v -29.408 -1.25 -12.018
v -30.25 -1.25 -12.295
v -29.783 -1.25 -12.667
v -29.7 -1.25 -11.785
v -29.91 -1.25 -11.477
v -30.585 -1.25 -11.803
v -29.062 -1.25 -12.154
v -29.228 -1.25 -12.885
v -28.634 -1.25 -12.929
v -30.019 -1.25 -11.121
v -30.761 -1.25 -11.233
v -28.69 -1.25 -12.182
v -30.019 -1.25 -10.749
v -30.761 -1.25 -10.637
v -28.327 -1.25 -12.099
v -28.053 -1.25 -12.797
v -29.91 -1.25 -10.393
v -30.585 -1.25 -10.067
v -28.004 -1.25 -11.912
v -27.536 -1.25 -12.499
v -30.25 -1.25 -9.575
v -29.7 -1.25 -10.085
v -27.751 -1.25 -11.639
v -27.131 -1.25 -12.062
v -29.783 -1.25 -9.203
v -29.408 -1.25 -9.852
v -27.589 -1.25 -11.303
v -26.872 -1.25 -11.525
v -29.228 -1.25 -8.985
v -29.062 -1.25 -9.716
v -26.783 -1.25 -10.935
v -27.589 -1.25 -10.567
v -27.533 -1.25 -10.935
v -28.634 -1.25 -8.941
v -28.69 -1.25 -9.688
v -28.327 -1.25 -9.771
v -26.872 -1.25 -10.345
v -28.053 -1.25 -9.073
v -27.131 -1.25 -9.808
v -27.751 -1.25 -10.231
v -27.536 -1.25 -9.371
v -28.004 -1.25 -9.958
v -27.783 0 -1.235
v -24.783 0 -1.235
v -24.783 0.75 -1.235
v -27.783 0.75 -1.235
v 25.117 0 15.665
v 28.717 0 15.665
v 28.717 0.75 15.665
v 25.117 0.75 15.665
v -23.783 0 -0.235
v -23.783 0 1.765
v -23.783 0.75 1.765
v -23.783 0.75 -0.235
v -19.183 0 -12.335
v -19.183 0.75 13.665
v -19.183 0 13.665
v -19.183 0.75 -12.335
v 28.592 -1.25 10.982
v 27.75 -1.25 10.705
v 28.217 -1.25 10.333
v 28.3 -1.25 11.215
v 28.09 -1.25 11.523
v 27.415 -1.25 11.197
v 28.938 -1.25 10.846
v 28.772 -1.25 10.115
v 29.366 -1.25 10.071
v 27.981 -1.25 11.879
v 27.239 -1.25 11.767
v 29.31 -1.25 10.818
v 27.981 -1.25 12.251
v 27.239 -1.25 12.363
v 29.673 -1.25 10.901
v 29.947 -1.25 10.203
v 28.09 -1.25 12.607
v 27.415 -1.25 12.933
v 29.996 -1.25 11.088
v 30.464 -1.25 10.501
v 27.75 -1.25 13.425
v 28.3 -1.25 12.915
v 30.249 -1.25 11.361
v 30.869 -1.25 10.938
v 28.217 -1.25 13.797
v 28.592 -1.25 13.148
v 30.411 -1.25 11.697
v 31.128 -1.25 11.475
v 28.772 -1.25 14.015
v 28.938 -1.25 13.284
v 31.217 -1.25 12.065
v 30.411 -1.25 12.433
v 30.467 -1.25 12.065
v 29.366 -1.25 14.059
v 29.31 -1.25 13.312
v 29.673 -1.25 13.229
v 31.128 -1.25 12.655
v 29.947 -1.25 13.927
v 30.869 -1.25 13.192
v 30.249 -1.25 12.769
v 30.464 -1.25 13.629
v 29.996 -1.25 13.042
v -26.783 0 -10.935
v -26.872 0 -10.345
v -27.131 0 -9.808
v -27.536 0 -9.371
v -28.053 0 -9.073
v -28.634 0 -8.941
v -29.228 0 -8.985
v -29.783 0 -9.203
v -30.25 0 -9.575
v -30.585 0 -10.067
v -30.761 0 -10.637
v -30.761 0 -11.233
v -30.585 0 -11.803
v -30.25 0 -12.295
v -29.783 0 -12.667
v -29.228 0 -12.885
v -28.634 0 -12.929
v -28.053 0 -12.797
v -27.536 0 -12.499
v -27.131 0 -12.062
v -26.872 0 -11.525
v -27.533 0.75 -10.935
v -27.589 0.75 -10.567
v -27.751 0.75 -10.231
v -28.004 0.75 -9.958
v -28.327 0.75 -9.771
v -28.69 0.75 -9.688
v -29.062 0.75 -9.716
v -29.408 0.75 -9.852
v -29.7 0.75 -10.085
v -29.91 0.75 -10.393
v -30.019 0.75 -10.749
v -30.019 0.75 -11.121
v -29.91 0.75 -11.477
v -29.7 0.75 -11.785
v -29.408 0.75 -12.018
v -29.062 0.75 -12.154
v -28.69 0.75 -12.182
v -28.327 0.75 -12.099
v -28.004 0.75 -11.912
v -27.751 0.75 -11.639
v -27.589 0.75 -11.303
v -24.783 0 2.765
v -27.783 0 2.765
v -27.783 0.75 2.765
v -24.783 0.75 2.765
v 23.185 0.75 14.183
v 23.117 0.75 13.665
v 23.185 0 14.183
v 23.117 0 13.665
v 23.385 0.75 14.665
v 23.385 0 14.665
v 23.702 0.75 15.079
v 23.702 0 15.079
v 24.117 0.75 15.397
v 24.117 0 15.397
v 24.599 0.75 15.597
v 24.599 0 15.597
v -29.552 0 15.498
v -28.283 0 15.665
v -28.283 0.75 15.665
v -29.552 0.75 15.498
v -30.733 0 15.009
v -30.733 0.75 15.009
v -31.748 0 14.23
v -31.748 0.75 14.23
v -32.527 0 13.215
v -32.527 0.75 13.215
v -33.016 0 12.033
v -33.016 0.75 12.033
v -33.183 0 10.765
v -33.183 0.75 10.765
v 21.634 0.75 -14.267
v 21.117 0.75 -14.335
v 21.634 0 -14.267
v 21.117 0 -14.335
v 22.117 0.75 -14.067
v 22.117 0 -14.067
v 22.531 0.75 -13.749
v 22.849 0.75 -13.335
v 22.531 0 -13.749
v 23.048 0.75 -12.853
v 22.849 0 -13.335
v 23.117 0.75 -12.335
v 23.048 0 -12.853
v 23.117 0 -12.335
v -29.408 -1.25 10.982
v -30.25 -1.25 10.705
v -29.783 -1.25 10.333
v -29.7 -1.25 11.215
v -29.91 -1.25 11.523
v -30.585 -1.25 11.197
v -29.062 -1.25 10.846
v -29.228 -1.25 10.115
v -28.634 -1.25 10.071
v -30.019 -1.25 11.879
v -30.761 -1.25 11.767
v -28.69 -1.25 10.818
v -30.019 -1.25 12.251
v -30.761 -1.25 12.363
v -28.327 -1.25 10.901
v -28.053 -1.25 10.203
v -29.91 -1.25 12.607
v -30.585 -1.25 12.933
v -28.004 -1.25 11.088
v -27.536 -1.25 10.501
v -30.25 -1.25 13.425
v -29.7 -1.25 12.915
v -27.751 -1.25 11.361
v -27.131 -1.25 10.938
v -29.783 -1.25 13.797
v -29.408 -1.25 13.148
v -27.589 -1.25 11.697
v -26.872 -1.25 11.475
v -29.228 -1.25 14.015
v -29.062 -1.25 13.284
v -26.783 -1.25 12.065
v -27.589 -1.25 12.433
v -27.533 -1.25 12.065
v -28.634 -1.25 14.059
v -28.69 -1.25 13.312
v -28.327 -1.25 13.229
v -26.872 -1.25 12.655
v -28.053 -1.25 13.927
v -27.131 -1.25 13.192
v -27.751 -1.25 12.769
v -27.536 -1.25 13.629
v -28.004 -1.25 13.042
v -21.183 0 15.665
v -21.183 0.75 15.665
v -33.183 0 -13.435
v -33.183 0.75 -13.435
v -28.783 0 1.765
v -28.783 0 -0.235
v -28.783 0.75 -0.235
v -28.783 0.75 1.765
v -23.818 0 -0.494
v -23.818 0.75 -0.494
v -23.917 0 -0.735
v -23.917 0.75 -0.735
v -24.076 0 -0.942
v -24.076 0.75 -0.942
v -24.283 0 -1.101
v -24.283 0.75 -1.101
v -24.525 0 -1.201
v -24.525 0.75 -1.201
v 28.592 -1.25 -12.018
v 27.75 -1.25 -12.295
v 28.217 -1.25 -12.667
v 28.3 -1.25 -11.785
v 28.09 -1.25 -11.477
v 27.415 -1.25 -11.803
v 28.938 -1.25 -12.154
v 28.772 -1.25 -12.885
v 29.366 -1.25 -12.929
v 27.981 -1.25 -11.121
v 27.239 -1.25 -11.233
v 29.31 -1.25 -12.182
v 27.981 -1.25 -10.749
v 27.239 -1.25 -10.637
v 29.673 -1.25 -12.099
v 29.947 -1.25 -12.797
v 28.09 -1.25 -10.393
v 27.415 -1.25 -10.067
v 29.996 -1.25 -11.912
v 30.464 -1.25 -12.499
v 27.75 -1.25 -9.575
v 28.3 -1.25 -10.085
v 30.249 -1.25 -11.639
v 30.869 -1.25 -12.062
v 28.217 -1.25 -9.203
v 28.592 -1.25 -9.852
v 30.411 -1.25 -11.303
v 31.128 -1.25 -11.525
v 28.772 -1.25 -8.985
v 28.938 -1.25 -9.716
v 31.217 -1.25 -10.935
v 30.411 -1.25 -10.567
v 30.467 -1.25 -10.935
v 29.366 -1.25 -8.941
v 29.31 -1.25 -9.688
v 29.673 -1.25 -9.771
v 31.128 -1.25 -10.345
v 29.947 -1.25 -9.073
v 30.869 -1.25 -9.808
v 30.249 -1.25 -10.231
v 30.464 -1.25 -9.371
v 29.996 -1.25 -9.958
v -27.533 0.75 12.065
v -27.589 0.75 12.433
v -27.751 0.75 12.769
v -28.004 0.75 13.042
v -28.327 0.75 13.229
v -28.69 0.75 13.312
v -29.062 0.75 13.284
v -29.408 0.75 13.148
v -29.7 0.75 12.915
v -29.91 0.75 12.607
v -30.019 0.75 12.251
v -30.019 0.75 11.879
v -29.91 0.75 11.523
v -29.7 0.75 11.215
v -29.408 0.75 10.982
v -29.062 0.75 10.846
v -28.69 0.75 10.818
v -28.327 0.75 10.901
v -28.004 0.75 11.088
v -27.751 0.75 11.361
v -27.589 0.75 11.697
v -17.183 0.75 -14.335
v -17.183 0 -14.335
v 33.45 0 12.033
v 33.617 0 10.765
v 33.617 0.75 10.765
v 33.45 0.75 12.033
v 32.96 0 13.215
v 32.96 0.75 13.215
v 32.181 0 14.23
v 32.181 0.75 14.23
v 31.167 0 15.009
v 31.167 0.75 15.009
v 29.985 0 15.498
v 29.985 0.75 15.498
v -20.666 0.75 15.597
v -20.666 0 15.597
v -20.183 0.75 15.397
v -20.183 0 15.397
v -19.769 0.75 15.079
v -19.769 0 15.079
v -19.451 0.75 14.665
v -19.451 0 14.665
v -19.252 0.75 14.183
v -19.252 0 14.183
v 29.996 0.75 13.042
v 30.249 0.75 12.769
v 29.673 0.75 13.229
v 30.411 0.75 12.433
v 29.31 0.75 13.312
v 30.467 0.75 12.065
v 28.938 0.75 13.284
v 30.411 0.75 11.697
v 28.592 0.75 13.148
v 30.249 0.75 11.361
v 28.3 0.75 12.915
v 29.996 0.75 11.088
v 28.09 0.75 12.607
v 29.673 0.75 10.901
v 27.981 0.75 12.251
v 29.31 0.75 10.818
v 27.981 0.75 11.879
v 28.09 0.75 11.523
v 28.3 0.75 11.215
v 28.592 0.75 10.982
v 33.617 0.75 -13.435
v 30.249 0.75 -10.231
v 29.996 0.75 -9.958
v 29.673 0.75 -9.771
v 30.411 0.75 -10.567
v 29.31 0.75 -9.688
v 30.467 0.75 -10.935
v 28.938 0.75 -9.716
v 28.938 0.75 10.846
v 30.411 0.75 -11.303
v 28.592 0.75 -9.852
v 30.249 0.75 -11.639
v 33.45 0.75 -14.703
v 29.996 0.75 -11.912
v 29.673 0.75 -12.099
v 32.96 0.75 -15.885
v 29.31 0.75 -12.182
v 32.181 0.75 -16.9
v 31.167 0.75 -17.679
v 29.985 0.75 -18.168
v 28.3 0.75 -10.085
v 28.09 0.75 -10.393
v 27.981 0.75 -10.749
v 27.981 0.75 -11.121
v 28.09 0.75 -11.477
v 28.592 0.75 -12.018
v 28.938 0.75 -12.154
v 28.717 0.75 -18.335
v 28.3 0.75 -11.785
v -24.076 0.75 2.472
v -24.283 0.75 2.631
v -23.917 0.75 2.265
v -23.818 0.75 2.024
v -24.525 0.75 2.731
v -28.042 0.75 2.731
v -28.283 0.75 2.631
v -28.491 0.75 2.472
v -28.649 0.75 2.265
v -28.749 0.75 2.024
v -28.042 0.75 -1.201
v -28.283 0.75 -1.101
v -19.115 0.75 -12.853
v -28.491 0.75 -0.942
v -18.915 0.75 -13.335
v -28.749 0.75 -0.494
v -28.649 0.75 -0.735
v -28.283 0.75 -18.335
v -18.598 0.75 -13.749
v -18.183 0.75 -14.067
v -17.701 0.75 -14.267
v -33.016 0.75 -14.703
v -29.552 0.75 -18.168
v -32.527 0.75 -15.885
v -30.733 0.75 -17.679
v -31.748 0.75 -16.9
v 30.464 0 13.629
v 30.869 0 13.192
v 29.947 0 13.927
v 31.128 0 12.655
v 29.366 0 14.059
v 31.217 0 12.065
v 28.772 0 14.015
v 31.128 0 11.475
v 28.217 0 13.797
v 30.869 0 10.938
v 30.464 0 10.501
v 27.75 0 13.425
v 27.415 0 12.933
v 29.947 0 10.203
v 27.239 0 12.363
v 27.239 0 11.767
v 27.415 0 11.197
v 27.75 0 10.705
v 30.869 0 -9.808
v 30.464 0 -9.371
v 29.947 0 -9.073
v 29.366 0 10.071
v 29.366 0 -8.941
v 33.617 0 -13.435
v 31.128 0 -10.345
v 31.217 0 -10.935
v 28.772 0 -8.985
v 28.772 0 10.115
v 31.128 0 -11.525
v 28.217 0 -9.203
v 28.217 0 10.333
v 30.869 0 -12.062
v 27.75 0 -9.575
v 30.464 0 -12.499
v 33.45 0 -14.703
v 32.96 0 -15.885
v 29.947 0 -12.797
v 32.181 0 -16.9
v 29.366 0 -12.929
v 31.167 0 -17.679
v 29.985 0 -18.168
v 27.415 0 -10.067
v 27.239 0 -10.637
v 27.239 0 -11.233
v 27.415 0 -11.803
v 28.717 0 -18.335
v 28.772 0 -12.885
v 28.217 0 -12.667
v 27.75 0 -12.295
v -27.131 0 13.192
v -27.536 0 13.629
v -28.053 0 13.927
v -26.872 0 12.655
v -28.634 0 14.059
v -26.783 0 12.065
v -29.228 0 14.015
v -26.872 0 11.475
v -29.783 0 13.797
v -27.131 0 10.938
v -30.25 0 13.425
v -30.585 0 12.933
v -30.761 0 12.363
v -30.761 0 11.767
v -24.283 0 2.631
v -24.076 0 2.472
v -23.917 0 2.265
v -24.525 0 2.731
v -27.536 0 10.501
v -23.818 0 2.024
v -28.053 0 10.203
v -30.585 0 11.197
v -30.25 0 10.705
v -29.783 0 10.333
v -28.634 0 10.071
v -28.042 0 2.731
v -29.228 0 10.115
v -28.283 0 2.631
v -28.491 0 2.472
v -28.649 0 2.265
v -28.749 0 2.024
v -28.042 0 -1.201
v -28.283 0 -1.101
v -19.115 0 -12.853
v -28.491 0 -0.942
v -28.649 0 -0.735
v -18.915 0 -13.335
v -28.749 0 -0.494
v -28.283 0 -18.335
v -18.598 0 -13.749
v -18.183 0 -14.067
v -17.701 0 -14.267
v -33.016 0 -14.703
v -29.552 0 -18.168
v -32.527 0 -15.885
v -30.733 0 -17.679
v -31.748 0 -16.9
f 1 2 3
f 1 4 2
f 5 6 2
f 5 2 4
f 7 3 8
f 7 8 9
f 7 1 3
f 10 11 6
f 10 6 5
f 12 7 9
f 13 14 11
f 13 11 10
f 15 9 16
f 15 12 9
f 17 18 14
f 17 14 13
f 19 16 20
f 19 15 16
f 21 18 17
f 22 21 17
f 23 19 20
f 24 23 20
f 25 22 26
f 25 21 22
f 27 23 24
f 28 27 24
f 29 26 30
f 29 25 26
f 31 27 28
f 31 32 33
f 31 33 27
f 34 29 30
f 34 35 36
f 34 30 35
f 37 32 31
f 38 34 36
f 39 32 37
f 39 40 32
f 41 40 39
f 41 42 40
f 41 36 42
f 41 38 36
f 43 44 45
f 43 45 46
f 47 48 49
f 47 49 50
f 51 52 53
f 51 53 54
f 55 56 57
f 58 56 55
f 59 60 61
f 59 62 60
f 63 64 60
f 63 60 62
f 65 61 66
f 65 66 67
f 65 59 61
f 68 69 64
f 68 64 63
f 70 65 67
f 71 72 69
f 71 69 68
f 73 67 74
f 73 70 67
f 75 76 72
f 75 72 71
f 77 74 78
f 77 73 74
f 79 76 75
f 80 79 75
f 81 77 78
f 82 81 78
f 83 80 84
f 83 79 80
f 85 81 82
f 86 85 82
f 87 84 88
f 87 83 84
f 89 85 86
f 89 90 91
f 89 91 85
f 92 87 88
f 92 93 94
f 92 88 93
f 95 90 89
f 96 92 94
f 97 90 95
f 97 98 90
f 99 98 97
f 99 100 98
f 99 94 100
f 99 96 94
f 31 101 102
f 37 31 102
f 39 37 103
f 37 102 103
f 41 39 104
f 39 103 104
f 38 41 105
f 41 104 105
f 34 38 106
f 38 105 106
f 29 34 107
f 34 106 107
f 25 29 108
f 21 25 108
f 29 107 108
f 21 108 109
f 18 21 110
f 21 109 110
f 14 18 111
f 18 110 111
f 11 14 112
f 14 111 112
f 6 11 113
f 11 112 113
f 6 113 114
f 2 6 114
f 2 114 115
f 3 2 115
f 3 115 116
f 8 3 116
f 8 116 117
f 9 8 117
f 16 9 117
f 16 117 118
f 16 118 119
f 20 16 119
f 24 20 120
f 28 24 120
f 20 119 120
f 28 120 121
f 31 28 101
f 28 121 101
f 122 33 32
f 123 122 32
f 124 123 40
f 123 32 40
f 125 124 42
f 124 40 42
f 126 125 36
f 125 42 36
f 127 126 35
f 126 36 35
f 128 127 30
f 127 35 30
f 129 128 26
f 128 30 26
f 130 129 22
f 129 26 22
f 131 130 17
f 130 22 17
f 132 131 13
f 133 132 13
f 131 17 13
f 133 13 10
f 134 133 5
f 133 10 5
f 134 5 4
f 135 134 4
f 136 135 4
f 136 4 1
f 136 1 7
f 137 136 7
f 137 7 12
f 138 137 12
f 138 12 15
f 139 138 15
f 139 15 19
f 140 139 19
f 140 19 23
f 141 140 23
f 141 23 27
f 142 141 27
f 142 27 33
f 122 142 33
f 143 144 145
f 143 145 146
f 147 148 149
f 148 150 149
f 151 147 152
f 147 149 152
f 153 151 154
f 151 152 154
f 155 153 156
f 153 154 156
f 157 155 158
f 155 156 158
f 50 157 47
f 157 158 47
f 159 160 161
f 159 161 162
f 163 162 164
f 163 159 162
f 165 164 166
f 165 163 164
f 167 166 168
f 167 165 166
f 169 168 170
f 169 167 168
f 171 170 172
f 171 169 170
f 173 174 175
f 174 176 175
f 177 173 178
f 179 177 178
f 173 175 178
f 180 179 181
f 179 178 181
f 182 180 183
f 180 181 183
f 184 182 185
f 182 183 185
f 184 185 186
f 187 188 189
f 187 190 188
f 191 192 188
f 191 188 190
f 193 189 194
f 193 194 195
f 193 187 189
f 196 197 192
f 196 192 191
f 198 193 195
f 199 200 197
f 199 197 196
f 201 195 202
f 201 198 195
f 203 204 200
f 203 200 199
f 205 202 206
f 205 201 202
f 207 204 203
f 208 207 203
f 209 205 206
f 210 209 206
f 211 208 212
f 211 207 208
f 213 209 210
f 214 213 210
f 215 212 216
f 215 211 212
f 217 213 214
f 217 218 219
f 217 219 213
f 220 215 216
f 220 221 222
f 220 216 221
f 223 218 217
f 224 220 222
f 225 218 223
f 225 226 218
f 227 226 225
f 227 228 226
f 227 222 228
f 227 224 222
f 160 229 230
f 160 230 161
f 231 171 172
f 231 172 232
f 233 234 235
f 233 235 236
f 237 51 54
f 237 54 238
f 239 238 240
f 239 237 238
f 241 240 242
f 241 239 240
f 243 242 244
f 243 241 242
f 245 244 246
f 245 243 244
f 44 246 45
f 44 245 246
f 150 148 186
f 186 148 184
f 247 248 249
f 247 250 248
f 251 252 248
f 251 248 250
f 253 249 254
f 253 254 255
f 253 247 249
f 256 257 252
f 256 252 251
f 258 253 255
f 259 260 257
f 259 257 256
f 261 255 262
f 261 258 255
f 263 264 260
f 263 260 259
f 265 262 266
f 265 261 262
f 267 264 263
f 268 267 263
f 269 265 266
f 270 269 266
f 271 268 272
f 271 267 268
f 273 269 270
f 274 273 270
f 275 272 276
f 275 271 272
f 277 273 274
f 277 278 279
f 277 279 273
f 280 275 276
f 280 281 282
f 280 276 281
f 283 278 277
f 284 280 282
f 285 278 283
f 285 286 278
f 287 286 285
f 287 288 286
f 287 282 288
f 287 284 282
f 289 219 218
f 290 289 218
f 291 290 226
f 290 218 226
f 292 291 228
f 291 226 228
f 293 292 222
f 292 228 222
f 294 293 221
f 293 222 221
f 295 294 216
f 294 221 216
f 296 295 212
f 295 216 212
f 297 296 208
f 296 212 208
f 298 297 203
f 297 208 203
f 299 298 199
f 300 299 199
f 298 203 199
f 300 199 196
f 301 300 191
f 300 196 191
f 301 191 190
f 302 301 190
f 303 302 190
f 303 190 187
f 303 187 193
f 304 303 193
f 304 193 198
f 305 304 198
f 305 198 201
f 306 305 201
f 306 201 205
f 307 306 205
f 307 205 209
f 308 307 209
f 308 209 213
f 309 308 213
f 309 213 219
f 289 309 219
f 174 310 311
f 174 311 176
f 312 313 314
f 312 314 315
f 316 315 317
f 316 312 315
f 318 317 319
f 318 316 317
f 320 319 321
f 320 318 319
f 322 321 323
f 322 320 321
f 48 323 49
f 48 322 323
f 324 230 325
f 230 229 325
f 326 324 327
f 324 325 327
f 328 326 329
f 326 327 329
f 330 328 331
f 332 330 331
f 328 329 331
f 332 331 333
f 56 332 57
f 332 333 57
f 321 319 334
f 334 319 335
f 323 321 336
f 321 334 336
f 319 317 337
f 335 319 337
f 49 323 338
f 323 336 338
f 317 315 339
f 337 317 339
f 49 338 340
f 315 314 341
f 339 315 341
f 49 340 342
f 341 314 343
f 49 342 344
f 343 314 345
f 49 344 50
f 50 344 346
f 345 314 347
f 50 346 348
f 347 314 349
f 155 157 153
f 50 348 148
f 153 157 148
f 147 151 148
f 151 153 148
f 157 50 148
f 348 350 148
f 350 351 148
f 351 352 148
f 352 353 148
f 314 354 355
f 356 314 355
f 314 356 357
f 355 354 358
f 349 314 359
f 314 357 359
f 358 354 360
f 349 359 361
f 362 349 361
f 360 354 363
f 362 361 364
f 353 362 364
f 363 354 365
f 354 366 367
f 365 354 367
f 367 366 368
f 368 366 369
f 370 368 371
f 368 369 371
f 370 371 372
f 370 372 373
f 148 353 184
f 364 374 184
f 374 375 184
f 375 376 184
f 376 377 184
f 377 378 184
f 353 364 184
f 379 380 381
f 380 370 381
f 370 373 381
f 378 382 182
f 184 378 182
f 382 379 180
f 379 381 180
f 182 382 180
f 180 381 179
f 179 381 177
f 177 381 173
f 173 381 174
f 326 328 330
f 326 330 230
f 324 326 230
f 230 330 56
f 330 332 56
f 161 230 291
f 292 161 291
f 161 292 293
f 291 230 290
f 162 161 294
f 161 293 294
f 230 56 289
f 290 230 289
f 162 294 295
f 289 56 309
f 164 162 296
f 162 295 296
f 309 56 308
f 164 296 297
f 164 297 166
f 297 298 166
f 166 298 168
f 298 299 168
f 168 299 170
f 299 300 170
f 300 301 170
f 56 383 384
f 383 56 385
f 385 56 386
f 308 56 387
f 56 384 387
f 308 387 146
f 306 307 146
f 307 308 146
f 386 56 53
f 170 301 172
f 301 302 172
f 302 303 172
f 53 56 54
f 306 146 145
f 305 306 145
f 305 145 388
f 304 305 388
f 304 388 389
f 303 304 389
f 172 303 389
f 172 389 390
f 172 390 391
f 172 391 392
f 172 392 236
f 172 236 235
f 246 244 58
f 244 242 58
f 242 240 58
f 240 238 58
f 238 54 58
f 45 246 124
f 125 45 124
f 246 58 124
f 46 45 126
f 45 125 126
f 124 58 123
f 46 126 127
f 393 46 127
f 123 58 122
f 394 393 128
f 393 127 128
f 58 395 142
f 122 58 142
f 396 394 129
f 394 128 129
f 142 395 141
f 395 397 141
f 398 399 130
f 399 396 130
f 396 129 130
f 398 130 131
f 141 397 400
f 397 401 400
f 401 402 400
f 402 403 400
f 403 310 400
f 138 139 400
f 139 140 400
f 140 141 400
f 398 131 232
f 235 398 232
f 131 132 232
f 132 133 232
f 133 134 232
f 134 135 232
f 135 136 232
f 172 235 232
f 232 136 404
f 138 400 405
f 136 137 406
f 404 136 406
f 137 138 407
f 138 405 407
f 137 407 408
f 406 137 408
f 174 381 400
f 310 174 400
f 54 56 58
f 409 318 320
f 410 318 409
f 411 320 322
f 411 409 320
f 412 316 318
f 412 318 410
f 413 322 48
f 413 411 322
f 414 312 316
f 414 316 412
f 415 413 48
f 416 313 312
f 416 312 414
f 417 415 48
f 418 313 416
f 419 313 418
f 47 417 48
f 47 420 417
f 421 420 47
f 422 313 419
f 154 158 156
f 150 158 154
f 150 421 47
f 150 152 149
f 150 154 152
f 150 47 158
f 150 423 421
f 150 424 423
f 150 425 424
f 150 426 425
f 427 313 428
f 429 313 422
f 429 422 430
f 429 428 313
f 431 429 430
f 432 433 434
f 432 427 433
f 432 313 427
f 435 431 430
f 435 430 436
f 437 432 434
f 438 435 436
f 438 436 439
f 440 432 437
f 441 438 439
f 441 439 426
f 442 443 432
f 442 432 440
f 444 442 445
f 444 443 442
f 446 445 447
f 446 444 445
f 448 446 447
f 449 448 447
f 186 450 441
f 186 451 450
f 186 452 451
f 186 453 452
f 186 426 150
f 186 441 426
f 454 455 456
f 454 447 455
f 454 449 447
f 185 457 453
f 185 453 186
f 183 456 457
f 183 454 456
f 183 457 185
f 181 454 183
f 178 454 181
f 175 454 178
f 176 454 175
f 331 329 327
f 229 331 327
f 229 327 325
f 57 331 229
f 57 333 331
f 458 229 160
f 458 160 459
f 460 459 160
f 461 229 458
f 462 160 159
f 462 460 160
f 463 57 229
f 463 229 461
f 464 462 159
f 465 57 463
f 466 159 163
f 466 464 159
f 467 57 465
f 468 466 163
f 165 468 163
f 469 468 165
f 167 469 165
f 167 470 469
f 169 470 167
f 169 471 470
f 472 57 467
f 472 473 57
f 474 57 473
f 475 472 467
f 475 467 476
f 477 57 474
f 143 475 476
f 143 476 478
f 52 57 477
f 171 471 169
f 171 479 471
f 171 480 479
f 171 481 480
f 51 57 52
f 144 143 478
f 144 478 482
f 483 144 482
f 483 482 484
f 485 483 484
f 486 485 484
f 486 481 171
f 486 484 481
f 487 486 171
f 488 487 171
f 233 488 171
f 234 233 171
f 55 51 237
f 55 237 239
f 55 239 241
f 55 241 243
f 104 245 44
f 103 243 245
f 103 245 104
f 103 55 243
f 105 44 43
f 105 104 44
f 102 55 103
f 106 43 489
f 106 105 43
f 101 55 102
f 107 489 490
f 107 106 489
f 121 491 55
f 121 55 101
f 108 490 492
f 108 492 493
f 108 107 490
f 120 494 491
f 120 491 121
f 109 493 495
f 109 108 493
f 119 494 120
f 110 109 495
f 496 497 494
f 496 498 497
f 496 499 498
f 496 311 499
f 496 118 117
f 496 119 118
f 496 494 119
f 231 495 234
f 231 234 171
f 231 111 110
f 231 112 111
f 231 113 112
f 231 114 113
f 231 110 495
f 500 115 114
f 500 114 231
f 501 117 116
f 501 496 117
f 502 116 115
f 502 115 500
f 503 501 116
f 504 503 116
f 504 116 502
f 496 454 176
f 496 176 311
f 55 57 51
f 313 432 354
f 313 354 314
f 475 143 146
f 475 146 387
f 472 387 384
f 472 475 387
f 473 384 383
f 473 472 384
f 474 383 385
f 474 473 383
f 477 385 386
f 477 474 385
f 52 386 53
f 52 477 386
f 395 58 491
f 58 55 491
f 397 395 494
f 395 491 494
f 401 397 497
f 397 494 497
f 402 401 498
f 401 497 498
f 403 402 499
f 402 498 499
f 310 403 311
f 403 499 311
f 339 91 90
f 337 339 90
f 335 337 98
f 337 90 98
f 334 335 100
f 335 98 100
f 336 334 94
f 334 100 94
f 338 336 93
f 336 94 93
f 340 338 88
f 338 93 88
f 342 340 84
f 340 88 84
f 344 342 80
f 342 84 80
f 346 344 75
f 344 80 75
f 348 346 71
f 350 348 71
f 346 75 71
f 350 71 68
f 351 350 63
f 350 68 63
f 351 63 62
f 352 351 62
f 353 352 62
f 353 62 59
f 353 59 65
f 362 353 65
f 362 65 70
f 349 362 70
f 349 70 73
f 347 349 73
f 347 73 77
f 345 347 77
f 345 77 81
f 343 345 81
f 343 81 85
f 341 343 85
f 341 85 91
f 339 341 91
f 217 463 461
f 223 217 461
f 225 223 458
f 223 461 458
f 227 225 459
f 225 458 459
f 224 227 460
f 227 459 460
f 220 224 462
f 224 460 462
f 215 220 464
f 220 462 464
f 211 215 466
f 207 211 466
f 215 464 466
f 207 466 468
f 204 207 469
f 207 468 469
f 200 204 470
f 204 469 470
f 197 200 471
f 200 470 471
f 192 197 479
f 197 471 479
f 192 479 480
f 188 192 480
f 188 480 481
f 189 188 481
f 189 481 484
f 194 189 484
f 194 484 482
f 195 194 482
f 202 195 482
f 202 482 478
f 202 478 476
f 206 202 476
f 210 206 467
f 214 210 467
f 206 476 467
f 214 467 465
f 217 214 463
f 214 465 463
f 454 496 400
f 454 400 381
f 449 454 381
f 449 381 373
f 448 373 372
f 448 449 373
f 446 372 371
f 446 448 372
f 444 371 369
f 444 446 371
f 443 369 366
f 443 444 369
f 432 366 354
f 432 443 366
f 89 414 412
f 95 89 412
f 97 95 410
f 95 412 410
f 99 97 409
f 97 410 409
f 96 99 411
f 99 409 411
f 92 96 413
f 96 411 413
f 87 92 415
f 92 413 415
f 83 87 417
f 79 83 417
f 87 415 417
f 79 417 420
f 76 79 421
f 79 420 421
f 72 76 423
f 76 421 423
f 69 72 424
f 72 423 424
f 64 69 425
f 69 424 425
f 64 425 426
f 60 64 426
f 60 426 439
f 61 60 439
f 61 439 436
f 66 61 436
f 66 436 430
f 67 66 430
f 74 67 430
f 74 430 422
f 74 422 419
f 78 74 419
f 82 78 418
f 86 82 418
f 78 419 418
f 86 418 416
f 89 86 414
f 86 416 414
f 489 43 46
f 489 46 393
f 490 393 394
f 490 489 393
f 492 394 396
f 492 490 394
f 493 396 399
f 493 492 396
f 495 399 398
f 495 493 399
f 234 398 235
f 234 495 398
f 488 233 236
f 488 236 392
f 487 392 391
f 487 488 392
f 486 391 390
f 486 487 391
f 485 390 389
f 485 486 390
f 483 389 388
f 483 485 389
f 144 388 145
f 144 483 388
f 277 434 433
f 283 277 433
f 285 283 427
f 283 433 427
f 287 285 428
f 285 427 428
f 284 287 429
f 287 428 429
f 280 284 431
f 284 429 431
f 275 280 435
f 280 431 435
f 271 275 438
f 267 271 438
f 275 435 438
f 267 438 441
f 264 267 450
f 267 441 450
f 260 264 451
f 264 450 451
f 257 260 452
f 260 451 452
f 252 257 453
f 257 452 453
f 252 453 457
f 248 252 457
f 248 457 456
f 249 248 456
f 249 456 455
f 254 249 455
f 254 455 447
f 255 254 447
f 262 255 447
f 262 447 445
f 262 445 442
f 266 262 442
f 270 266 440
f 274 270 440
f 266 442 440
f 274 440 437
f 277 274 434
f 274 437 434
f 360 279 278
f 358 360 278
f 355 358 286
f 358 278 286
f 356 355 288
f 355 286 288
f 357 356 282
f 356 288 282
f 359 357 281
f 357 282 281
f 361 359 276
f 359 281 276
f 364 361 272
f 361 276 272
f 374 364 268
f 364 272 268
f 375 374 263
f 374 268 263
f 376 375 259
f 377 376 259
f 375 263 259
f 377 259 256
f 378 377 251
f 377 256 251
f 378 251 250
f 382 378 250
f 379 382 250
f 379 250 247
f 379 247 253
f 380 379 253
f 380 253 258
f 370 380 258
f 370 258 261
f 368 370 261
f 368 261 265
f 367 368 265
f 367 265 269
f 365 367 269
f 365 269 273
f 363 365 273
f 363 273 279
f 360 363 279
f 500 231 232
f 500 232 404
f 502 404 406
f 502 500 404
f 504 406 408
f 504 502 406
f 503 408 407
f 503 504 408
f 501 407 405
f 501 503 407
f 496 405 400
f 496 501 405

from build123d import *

# Parameters (mm, degrees)
EXTRUDE_1_DEPTH     = 0.75
SKETCH_2_R          = 2
EXTRUDE_2_DEPTH     = 1.25
SKETCH_3_R          = 1.25
CUT_EXTRUDE_1_DEPTH = 3
SKETCH_4_W          = 42.3
SKETCH_4_H          = 30
CUT_EXTRUDE_2_DEPTH = 3
FILLET_1_R          = 2
CUT_EXTRUDE_3_DEPTH = 1.75


with BuildPart() as part:
    # 草图1 → 凸台-拉伸1 (new body)
    with BuildSketch(Plane(origin=(0, 0, 0), x_dir=(1, 0, 0), z_dir=(0, 1, 0))):
        with BuildLine():
            Line((-28.283443195, 18.335), (28.716556805, 18.335))
            ThreePointArc((28.716556805, 18.335), (32.181380033, 16.899823228), (33.616556805, 13.435))
            Line((33.616556805, 13.435), (33.616556805, -10.765))
            ThreePointArc((33.616556805, -10.765), (32.181380033, -14.229823228), (28.716556805, -15.665))
            Line((28.716556805, -15.665), (20.216556805, -15.665))
            Line((20.216556805, -15.665), (-19.783443195, -15.665))
            Line((-19.783443195, -15.665), (-28.283443195, -15.665))
            ThreePointArc((-28.283443195, -15.665), (-31.748266423, -14.229823228), (-33.183443195, -10.765))
            Line((-33.183443195, -10.765), (-33.183443195, 13.435))
            ThreePointArc((-33.183443195, 13.435), (-31.748266423, 16.899823228), (-28.283443195, 18.335))
        make_face()
    extrude(amount=EXTRUDE_1_DEPTH)

    # 草图2 → 凸台-拉伸2 (add)
    with BuildSketch(Plane.XZ):
        with Locations((-28.783443195, 12.065)):
            Circle(SKETCH_2_R)
        with Locations((-28.783443195, -10.935)):
            Circle(SKETCH_2_R)
        with Locations((29.216556805, 12.065)):
            Circle(SKETCH_2_R)
        with Locations((29.216556805, -10.935)):
            Circle(SKETCH_2_R)
    extrude(amount=EXTRUDE_2_DEPTH)

    # 草图3 → 切除-拉伸1 (cut, through all)
    with BuildSketch(Plane.XZ.offset(1.25)):
        with Locations((-28.783443195, 12.065)):
            Circle(SKETCH_3_R)
        with Locations((-28.783443195, -10.935)):
            Circle(SKETCH_3_R)
        with Locations((29.216556805, -10.935)):
            Circle(SKETCH_3_R)
        with Locations((29.216556805, 12.065)):
            Circle(SKETCH_3_R)
    extrude(amount=-CUT_EXTRUDE_1_DEPTH, mode=Mode.SUBTRACT)

    # 草图4 → 切除-拉伸2 (cut, through all)
    with BuildSketch(Plane(origin=(0, 0.75, 0), x_dir=(1, 0, 0), z_dir=(0, 1, 0))):
        with Locations((1.966556805, -0.665)):
            Rectangle(SKETCH_4_W, SKETCH_4_H)
    extrude(amount=-CUT_EXTRUDE_2_DEPTH, mode=Mode.SUBTRACT)

    # 圆角1
    fillet_1_edges = [part.edges().sort_by_distance(p)[0] for p in [
        (-19.183443195, 0.375, 15.665),
        (-19.183443195, 0.375, -14.335),
        (23.116556805, 0.375, -14.335),
        (23.116556805, 0.375, 15.665),
    ]]
    fillet(fillet_1_edges, radius=FILLET_1_R)

    # 草图6 → 切除-拉伸3 (cut, through all)
    with BuildSketch(Plane.XZ):
        with BuildLine():
            Line((-27.783443195, 2.765), (-24.783443195, 2.765))
            ThreePointArc((-24.783443195, 2.765), (-24.076336414, 2.472106781), (-23.783443195, 1.765))
            Line((-23.783443195, 1.765), (-23.783443195, -0.235))
            ThreePointArc((-23.783443195, -0.235), (-24.076336414, -0.942106781), (-24.783443195, -1.235))
            Line((-24.783443195, -1.235), (-27.783443195, -1.235))
            ThreePointArc((-27.783443195, -1.235), (-28.490549976, -0.942106781), (-28.783443195, -0.235))
            Line((-28.783443195, -0.235), (-28.783443195, 1.765))
            ThreePointArc((-28.783443195, 1.765), (-28.490549976, 2.472106781), (-27.783443195, 2.765))
        make_face()
    extrude(amount=-CUT_EXTRUDE_3_DEPTH, mode=Mode.SUBTRACT)


solid = part.part
